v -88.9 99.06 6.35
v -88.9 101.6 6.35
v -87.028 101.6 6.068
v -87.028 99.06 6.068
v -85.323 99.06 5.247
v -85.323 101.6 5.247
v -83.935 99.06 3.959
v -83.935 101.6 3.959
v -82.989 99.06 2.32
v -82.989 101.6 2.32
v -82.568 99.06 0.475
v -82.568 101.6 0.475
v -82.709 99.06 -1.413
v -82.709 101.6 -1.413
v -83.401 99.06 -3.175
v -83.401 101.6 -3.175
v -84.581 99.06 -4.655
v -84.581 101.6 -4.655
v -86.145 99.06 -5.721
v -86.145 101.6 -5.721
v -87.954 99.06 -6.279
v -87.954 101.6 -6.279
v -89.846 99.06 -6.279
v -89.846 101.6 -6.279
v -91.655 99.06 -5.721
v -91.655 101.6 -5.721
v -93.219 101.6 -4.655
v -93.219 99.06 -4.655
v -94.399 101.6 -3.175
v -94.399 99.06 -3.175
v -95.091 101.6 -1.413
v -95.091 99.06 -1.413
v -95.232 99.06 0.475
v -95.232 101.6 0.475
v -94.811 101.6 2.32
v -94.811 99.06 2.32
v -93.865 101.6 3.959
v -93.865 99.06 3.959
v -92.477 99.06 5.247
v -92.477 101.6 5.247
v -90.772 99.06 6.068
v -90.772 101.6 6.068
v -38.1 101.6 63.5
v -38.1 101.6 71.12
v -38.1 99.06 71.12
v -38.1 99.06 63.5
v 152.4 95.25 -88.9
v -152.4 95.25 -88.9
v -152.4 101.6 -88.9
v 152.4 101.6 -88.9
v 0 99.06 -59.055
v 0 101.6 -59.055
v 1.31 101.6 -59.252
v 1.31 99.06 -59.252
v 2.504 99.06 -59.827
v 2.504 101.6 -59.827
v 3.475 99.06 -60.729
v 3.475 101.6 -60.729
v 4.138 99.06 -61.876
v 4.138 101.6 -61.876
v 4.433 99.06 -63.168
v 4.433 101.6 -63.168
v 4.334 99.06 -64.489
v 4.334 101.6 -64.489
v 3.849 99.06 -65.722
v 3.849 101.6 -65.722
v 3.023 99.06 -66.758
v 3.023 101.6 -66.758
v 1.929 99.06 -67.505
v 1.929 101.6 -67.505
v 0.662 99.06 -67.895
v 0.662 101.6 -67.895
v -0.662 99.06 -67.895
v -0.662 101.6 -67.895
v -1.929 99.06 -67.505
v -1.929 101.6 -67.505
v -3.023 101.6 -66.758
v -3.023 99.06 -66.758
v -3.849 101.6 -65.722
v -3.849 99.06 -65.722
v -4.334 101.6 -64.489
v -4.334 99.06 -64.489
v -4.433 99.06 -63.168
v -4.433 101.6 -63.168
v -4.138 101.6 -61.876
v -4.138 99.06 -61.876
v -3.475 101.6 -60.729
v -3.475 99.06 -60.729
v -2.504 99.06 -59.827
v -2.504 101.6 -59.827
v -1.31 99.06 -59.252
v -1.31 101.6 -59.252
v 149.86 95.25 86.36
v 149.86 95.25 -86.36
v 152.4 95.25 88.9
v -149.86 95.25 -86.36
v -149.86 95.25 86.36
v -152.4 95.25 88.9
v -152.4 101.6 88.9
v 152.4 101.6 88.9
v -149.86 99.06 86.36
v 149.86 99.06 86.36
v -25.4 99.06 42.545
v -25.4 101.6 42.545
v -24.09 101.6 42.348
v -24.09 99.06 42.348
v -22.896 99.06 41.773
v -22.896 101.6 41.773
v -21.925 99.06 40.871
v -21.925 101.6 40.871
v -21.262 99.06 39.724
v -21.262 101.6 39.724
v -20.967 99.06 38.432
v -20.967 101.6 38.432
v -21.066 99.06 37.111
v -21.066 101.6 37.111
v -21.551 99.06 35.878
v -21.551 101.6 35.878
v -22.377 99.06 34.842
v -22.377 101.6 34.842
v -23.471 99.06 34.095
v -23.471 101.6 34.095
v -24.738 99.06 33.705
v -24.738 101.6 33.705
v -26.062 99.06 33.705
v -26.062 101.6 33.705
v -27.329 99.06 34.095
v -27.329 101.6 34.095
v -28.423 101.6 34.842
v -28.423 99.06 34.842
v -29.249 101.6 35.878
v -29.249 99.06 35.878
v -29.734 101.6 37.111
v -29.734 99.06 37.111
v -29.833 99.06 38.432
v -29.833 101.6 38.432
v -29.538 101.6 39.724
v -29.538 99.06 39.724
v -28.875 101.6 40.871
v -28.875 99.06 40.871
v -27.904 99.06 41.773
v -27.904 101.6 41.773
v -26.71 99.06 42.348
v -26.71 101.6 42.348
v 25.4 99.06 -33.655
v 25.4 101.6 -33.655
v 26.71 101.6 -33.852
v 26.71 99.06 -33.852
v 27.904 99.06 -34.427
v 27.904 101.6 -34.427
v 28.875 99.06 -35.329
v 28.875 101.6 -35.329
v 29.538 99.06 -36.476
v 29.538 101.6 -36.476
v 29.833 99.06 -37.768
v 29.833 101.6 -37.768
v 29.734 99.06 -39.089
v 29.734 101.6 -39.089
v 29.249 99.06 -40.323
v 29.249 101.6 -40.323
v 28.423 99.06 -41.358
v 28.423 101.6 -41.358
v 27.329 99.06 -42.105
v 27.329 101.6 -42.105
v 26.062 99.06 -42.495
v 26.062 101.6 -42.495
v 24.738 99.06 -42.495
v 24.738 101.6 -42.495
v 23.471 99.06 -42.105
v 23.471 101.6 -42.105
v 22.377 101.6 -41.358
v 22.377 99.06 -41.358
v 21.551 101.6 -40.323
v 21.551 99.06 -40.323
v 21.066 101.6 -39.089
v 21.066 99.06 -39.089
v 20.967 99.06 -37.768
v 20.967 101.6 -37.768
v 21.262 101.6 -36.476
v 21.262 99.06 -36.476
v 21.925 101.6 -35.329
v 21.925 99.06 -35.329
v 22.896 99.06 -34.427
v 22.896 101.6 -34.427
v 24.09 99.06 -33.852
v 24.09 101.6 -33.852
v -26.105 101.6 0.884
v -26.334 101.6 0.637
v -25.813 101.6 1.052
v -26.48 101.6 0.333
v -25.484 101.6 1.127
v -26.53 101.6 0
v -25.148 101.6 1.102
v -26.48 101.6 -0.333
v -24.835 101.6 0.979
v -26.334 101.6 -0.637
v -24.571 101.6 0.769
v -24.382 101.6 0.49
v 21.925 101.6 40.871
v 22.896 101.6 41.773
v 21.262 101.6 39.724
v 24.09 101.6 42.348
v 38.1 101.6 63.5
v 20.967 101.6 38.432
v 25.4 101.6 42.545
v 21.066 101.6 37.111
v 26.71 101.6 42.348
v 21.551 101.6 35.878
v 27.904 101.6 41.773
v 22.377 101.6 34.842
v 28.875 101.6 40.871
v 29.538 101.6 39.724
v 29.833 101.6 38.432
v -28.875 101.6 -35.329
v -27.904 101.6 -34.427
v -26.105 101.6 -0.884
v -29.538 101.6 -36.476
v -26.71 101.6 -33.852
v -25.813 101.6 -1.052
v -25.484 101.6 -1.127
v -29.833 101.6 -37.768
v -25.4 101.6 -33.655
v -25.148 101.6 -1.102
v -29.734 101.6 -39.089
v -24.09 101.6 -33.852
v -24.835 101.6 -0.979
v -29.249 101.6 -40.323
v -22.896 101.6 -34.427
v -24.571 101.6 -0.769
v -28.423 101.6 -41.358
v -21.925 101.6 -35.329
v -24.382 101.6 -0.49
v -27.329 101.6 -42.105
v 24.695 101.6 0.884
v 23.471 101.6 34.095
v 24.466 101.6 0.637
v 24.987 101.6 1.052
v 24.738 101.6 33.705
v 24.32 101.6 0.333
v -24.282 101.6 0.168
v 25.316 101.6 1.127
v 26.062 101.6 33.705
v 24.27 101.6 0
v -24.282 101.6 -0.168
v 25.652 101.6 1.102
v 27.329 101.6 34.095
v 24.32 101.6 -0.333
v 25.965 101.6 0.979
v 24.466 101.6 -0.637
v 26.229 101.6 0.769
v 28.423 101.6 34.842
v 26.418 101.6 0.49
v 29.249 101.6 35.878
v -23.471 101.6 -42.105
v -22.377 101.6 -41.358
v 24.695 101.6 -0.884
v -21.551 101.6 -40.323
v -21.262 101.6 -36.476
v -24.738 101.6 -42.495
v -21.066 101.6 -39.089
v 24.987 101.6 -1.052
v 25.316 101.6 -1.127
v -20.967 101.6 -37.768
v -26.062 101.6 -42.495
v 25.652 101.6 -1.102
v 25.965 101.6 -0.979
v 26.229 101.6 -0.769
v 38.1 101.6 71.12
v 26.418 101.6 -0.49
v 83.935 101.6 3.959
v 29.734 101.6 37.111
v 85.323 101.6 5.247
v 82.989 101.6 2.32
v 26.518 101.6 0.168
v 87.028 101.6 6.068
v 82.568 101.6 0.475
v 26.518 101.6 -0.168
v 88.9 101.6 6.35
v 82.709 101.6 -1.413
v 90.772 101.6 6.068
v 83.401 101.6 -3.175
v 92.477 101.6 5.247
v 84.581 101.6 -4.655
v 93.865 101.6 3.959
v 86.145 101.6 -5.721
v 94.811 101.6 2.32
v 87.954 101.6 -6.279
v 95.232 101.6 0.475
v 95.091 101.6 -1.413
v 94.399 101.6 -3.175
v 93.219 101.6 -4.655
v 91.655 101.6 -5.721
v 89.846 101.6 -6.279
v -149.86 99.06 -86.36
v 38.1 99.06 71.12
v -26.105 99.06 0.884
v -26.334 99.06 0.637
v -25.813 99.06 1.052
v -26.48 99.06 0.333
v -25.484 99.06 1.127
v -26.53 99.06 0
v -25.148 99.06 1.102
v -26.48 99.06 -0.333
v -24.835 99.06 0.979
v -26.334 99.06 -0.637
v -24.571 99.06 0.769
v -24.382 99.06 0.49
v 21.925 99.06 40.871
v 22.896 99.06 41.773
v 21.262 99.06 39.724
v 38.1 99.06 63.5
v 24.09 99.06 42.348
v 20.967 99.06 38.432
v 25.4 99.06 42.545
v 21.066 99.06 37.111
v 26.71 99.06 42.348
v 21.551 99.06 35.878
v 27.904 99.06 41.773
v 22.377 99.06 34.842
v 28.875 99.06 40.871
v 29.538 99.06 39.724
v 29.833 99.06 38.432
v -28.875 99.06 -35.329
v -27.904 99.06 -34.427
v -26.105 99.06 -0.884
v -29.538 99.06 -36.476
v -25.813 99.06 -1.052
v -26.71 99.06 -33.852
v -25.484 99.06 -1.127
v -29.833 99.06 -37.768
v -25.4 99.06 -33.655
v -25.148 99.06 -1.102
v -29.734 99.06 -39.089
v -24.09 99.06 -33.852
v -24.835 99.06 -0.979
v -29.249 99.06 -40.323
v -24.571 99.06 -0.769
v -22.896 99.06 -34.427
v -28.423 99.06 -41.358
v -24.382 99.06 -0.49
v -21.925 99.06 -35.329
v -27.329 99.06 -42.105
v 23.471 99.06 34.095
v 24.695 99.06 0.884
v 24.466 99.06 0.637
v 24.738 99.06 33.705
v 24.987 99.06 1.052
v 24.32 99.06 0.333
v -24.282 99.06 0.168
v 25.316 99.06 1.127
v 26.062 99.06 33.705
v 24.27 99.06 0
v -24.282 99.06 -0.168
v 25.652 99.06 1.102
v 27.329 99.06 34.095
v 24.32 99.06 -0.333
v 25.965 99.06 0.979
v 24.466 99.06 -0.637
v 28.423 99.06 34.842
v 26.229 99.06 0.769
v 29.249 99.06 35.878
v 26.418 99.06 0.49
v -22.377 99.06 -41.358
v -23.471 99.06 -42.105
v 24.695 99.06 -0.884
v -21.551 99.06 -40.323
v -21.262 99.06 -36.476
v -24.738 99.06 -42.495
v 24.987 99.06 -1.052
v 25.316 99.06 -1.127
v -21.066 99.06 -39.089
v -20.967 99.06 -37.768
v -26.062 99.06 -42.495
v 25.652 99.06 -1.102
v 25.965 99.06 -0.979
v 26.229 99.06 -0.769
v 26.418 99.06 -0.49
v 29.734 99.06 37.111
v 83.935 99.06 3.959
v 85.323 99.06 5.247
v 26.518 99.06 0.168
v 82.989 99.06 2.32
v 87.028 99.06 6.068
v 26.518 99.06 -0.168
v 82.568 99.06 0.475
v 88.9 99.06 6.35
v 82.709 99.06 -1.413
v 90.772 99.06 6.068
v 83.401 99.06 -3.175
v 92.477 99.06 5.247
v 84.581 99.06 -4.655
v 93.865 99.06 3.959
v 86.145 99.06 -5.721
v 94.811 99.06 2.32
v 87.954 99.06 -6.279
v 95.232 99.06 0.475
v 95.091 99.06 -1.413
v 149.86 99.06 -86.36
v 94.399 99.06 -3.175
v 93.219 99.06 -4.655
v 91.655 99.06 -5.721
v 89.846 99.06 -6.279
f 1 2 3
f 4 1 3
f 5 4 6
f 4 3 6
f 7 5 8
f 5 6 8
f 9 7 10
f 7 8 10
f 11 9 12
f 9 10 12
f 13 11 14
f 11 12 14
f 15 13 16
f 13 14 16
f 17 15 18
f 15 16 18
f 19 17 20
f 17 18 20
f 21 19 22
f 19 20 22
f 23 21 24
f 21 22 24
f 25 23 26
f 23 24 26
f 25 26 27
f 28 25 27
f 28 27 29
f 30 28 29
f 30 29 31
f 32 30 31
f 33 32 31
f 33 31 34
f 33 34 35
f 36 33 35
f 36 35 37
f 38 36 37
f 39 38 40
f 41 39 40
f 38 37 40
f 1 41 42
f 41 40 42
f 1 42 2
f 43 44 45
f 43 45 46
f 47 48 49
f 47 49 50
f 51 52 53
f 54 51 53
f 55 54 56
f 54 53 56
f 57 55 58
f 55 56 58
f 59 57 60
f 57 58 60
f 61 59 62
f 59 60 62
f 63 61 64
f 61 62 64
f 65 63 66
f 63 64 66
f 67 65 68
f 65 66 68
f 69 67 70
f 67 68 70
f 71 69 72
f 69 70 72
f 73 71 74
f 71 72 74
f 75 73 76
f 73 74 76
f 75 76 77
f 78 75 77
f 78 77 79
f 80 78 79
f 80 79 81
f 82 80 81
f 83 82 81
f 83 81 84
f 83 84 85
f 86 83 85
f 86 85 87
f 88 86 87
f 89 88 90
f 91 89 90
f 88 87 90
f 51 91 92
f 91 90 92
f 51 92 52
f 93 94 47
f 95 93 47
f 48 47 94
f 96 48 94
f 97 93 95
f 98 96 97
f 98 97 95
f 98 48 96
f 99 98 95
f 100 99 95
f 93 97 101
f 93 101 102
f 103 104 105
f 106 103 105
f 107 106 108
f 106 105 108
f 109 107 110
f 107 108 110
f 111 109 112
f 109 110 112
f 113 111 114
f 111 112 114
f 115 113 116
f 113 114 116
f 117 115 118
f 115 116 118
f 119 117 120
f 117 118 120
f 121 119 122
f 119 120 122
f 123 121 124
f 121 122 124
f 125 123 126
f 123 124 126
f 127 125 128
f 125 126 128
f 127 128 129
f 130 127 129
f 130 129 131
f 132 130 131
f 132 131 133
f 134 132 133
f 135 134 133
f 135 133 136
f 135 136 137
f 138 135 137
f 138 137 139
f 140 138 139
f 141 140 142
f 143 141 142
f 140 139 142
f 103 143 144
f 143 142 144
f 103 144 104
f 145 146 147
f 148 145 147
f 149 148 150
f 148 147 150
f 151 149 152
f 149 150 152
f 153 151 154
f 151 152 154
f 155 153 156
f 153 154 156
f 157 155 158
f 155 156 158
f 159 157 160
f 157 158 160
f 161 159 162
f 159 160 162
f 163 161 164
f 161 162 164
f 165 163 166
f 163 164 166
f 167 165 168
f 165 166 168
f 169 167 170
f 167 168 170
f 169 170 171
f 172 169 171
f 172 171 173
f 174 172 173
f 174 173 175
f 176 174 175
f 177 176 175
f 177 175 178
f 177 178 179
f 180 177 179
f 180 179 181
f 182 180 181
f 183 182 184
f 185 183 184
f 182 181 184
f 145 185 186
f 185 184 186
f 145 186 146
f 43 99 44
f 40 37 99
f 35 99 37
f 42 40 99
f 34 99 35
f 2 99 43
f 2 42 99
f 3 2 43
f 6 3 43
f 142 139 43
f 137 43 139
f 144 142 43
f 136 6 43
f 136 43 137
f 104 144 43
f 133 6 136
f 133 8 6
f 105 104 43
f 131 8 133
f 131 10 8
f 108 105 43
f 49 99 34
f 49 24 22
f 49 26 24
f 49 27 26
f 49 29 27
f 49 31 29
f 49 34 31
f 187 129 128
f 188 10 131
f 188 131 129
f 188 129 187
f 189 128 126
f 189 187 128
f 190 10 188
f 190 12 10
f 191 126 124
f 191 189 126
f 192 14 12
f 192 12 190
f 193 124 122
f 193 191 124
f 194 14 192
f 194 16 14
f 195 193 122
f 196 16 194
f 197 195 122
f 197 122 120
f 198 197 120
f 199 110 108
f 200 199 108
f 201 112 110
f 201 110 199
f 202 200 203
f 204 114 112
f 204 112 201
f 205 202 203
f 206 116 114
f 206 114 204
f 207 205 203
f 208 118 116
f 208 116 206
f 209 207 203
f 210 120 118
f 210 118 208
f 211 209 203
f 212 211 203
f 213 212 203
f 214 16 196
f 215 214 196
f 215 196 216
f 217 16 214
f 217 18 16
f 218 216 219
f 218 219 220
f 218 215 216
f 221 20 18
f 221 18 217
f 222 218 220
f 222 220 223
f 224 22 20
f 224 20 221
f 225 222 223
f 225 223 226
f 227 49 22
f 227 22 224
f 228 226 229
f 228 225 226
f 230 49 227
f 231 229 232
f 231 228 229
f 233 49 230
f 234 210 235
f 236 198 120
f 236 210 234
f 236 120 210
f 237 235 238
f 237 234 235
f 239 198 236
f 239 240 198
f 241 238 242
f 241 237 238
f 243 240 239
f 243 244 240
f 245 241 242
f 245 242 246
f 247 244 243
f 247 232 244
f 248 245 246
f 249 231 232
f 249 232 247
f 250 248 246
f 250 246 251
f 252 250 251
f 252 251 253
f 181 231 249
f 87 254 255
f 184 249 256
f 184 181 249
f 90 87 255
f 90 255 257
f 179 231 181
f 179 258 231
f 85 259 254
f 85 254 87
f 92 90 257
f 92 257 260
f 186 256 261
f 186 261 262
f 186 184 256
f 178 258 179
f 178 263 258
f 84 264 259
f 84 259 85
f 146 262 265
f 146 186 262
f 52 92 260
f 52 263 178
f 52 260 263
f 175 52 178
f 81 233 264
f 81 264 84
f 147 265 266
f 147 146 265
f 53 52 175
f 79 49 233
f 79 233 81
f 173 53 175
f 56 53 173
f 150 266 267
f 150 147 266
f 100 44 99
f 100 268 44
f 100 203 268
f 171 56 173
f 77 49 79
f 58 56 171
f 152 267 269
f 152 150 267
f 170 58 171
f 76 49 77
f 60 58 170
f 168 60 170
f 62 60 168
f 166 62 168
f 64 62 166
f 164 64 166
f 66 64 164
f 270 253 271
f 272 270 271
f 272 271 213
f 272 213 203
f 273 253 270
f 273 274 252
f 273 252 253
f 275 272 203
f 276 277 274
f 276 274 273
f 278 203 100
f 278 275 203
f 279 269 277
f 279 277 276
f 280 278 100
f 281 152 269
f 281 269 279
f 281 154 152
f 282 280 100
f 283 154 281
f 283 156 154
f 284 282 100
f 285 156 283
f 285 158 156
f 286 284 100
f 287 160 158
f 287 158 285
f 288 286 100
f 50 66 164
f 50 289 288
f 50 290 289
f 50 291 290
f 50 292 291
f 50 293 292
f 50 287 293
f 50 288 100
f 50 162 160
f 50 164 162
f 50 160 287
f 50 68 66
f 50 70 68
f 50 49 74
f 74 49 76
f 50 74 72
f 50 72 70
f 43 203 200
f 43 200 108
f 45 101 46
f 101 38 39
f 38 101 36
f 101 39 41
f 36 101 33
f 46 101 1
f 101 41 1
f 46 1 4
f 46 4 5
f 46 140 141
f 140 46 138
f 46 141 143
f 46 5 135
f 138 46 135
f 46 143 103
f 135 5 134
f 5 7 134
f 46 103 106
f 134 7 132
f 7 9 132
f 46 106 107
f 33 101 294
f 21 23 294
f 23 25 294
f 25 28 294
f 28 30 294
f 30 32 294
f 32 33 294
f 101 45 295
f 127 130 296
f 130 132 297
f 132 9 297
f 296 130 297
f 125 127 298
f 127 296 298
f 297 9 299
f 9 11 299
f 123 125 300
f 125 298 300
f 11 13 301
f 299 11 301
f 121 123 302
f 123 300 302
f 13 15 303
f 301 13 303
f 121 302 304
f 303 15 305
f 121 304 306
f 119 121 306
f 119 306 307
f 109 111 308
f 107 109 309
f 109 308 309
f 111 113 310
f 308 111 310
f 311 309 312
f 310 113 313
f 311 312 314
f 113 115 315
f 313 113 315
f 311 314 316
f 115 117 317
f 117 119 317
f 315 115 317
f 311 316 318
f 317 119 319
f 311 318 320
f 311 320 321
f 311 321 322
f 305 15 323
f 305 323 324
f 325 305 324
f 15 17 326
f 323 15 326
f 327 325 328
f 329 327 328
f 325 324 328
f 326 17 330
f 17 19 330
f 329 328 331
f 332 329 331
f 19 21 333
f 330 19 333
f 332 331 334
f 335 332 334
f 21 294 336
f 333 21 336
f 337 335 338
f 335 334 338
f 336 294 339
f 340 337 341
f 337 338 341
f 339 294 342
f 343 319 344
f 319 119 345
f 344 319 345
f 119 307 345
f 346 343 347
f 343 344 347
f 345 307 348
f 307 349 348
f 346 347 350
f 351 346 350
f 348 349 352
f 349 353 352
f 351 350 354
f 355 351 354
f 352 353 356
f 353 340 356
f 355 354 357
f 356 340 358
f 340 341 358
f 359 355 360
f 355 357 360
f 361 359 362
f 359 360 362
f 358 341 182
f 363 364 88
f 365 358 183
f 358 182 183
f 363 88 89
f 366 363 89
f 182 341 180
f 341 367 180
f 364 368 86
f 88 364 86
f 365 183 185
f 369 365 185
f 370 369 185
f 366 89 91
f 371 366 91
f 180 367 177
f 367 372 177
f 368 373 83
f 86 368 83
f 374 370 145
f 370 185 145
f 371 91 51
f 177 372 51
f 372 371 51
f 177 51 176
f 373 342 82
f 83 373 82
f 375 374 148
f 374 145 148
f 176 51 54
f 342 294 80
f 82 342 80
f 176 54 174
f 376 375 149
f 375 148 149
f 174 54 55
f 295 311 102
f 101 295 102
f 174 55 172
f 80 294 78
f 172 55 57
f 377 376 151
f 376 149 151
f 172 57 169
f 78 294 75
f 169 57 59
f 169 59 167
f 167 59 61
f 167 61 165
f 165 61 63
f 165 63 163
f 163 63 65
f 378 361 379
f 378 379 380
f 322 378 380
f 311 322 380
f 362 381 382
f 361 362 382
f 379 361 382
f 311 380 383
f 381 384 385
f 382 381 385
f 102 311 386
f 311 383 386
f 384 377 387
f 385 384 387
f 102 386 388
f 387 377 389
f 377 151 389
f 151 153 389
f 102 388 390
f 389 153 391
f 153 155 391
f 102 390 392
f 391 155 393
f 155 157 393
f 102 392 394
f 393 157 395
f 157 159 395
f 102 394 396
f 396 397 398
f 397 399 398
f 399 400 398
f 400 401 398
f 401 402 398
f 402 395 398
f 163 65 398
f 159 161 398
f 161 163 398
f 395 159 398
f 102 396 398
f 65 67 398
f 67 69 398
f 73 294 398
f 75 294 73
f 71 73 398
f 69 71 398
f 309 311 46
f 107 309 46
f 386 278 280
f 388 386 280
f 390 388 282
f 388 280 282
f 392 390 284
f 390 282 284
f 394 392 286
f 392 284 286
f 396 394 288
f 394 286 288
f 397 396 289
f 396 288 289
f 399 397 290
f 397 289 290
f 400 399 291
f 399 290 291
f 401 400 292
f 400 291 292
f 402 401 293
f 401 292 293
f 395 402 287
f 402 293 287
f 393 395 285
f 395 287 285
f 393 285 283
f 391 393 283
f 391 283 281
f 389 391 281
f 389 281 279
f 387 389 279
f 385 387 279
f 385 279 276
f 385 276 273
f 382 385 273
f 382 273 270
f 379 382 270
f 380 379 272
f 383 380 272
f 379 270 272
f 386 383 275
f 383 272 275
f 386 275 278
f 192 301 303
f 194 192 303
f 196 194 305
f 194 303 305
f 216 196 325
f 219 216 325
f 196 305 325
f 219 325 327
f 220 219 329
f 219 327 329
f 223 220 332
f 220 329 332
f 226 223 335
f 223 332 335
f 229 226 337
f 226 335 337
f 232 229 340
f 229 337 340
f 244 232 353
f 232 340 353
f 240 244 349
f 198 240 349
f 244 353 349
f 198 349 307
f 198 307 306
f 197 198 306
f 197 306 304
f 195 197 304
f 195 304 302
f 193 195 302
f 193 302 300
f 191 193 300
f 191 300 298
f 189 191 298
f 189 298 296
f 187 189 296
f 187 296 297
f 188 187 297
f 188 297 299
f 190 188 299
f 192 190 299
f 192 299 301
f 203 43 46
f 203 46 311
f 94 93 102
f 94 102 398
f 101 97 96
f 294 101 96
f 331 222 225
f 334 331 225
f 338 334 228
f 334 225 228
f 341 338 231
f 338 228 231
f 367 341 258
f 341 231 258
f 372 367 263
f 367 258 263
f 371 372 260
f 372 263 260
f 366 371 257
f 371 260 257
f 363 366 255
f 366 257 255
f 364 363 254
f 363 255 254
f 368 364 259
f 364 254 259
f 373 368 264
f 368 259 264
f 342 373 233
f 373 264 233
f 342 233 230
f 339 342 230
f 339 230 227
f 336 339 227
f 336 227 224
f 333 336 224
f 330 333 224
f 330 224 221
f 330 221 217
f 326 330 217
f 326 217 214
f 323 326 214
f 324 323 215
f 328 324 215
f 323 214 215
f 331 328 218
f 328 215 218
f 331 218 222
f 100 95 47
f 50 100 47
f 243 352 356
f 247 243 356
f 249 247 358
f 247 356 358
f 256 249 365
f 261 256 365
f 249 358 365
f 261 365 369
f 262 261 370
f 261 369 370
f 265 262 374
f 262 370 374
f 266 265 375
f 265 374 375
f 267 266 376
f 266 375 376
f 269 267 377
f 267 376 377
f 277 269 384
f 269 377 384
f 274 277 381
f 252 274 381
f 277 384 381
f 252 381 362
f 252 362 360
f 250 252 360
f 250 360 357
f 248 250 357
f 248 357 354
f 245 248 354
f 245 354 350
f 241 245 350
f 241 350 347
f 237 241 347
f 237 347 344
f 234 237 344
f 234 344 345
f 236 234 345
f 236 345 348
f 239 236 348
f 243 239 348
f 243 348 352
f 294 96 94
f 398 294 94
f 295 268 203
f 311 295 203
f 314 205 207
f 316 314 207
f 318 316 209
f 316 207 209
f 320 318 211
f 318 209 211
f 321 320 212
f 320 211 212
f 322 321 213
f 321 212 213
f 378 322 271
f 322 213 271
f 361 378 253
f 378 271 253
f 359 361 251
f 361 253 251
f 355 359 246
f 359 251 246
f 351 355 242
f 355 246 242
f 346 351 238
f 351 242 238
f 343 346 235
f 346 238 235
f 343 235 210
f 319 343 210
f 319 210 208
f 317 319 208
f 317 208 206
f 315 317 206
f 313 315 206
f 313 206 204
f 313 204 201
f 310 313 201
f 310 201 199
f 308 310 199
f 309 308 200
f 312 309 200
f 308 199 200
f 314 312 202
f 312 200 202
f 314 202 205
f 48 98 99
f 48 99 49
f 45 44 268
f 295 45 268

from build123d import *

# Parameters (mm, degrees)
SKETCH1_W                 = 304.8
SKETCH1_H                 = 177.8
BOSS_EXTRUDE1_DEPTH       = 101.6
SHELL1_T                  = 2.54
SKETCH3_R                 = 6.35
CUT_EXTRUDE1_DEPTH        = 2.54
F_4_40_TAPPED_HOLE1_D     = 2.2606
F_4_40_TAPPED_HOLE1_DEPTH = 2.54
SKETCH11_R                = 4.445
CUT_EXTRUDE2_DEPTH        = 2.54
SKETCH12_R                = 4.445
SKETCH12_W                = 76.2
SKETCH12_H                = 7.62
CUT_EXTRUDE3_DEPTH        = 2.54
SKETCH13_R                = 10.659380334
CUT_EXTRUDE4_DEPTH        = 2.54
SKETCH14_W                = 177.8
SKETCH14_H                = 95.25
CUT_EXTRUDE5_DEPTH        = 334.35988061


with BuildPart() as part:
    # Sketch1 → Boss-Extrude1 (new body)
    with BuildSketch(Plane(origin=(0, 0, 0), x_dir=(1, 0, 0), z_dir=(0, 1, 0))):
        Rectangle(SKETCH1_W, SKETCH1_H)
    extrude(amount=BOSS_EXTRUDE1_DEPTH)

    # Shell1 (no face opened: a closed hollow body)
    add(offset(amount=-SHELL1_T, mode=Mode.PRIVATE), mode=Mode.SUBTRACT)

    # Sketch3 → Cut-Extrude1 (cut)
    with BuildSketch(Plane(origin=(0, 101.6, 0), x_dir=(1, 0, 0), z_dir=(0, 1, 0))):
        with Locations(Location((-88.9, 0, 0), (0, 0, 270))):
            Circle(SKETCH3_R)
        with Locations(Location((88.9, 0, 0), (0, 0, 270))):
            Circle(SKETCH3_R)
    extrude(amount=-CUT_EXTRUDE1_DEPTH, mode=Mode.SUBTRACT)

    # #4-40 Tapped Hole1
    with Locations(Plane(origin=(0, 101.6, 0), x_dir=(1, 0, 0), z_dir=(0, 1, 0))):
        with Locations((-25.4, 0), (25.4, 0)):
            Hole(F_4_40_TAPPED_HOLE1_D / 2, depth=F_4_40_TAPPED_HOLE1_DEPTH)

    # Sketch11 → Cut-Extrude2 (cut)
    with BuildSketch(Plane(origin=(0, 101.6, 0), x_dir=(1, 0, 0), z_dir=(0, 1, 0))):
        with Locations(Location((-25.4, 38.1, 0), (0, 0, 270))):
            Circle(SKETCH11_R)
        with Locations(Location((25.4, 38.1, 0), (0, 0, 270))):
            Circle(SKETCH11_R)
        with Locations(Location((25.4, -38.1, 0), (0, 0, 270))):
            Circle(SKETCH11_R)
        with Locations(Location((-25.4, -38.1, 0), (0, 0, 270))):
            Circle(SKETCH11_R)
    extrude(amount=-CUT_EXTRUDE2_DEPTH, mode=Mode.SUBTRACT)

    # Sketch12 → Cut-Extrude3 (cut)
    with BuildSketch(Plane(origin=(0, 101.6, 0), x_dir=(1, 0, 0), z_dir=(0, 1, 0))):
        with Locations(Location((0, 63.5, 0), (0, 0, 270))):
            Circle(SKETCH12_R)
        with Locations((0, -67.31)):
            Rectangle(SKETCH12_W, SKETCH12_H)
    extrude(amount=-CUT_EXTRUDE3_DEPTH, mode=Mode.SUBTRACT)

    # Sketch13 → Cut-Extrude4 (cut)
    with BuildSketch(Plane.XY.offset(88.9)):
        with Locations((0, 50.8)):
            Circle(SKETCH13_R)
    extrude(amount=-CUT_EXTRUDE4_DEPTH, mode=Mode.SUBTRACT)

    # Sketch14 → Cut-Extrude5 (cut, through all)
    with BuildSketch(Plane.ZY.offset(152.4)):
        with Locations((0, 47.625)):
            Rectangle(SKETCH14_W, SKETCH14_H)
    extrude(amount=-CUT_EXTRUDE5_DEPTH, mode=Mode.SUBTRACT)


solid = part.part
